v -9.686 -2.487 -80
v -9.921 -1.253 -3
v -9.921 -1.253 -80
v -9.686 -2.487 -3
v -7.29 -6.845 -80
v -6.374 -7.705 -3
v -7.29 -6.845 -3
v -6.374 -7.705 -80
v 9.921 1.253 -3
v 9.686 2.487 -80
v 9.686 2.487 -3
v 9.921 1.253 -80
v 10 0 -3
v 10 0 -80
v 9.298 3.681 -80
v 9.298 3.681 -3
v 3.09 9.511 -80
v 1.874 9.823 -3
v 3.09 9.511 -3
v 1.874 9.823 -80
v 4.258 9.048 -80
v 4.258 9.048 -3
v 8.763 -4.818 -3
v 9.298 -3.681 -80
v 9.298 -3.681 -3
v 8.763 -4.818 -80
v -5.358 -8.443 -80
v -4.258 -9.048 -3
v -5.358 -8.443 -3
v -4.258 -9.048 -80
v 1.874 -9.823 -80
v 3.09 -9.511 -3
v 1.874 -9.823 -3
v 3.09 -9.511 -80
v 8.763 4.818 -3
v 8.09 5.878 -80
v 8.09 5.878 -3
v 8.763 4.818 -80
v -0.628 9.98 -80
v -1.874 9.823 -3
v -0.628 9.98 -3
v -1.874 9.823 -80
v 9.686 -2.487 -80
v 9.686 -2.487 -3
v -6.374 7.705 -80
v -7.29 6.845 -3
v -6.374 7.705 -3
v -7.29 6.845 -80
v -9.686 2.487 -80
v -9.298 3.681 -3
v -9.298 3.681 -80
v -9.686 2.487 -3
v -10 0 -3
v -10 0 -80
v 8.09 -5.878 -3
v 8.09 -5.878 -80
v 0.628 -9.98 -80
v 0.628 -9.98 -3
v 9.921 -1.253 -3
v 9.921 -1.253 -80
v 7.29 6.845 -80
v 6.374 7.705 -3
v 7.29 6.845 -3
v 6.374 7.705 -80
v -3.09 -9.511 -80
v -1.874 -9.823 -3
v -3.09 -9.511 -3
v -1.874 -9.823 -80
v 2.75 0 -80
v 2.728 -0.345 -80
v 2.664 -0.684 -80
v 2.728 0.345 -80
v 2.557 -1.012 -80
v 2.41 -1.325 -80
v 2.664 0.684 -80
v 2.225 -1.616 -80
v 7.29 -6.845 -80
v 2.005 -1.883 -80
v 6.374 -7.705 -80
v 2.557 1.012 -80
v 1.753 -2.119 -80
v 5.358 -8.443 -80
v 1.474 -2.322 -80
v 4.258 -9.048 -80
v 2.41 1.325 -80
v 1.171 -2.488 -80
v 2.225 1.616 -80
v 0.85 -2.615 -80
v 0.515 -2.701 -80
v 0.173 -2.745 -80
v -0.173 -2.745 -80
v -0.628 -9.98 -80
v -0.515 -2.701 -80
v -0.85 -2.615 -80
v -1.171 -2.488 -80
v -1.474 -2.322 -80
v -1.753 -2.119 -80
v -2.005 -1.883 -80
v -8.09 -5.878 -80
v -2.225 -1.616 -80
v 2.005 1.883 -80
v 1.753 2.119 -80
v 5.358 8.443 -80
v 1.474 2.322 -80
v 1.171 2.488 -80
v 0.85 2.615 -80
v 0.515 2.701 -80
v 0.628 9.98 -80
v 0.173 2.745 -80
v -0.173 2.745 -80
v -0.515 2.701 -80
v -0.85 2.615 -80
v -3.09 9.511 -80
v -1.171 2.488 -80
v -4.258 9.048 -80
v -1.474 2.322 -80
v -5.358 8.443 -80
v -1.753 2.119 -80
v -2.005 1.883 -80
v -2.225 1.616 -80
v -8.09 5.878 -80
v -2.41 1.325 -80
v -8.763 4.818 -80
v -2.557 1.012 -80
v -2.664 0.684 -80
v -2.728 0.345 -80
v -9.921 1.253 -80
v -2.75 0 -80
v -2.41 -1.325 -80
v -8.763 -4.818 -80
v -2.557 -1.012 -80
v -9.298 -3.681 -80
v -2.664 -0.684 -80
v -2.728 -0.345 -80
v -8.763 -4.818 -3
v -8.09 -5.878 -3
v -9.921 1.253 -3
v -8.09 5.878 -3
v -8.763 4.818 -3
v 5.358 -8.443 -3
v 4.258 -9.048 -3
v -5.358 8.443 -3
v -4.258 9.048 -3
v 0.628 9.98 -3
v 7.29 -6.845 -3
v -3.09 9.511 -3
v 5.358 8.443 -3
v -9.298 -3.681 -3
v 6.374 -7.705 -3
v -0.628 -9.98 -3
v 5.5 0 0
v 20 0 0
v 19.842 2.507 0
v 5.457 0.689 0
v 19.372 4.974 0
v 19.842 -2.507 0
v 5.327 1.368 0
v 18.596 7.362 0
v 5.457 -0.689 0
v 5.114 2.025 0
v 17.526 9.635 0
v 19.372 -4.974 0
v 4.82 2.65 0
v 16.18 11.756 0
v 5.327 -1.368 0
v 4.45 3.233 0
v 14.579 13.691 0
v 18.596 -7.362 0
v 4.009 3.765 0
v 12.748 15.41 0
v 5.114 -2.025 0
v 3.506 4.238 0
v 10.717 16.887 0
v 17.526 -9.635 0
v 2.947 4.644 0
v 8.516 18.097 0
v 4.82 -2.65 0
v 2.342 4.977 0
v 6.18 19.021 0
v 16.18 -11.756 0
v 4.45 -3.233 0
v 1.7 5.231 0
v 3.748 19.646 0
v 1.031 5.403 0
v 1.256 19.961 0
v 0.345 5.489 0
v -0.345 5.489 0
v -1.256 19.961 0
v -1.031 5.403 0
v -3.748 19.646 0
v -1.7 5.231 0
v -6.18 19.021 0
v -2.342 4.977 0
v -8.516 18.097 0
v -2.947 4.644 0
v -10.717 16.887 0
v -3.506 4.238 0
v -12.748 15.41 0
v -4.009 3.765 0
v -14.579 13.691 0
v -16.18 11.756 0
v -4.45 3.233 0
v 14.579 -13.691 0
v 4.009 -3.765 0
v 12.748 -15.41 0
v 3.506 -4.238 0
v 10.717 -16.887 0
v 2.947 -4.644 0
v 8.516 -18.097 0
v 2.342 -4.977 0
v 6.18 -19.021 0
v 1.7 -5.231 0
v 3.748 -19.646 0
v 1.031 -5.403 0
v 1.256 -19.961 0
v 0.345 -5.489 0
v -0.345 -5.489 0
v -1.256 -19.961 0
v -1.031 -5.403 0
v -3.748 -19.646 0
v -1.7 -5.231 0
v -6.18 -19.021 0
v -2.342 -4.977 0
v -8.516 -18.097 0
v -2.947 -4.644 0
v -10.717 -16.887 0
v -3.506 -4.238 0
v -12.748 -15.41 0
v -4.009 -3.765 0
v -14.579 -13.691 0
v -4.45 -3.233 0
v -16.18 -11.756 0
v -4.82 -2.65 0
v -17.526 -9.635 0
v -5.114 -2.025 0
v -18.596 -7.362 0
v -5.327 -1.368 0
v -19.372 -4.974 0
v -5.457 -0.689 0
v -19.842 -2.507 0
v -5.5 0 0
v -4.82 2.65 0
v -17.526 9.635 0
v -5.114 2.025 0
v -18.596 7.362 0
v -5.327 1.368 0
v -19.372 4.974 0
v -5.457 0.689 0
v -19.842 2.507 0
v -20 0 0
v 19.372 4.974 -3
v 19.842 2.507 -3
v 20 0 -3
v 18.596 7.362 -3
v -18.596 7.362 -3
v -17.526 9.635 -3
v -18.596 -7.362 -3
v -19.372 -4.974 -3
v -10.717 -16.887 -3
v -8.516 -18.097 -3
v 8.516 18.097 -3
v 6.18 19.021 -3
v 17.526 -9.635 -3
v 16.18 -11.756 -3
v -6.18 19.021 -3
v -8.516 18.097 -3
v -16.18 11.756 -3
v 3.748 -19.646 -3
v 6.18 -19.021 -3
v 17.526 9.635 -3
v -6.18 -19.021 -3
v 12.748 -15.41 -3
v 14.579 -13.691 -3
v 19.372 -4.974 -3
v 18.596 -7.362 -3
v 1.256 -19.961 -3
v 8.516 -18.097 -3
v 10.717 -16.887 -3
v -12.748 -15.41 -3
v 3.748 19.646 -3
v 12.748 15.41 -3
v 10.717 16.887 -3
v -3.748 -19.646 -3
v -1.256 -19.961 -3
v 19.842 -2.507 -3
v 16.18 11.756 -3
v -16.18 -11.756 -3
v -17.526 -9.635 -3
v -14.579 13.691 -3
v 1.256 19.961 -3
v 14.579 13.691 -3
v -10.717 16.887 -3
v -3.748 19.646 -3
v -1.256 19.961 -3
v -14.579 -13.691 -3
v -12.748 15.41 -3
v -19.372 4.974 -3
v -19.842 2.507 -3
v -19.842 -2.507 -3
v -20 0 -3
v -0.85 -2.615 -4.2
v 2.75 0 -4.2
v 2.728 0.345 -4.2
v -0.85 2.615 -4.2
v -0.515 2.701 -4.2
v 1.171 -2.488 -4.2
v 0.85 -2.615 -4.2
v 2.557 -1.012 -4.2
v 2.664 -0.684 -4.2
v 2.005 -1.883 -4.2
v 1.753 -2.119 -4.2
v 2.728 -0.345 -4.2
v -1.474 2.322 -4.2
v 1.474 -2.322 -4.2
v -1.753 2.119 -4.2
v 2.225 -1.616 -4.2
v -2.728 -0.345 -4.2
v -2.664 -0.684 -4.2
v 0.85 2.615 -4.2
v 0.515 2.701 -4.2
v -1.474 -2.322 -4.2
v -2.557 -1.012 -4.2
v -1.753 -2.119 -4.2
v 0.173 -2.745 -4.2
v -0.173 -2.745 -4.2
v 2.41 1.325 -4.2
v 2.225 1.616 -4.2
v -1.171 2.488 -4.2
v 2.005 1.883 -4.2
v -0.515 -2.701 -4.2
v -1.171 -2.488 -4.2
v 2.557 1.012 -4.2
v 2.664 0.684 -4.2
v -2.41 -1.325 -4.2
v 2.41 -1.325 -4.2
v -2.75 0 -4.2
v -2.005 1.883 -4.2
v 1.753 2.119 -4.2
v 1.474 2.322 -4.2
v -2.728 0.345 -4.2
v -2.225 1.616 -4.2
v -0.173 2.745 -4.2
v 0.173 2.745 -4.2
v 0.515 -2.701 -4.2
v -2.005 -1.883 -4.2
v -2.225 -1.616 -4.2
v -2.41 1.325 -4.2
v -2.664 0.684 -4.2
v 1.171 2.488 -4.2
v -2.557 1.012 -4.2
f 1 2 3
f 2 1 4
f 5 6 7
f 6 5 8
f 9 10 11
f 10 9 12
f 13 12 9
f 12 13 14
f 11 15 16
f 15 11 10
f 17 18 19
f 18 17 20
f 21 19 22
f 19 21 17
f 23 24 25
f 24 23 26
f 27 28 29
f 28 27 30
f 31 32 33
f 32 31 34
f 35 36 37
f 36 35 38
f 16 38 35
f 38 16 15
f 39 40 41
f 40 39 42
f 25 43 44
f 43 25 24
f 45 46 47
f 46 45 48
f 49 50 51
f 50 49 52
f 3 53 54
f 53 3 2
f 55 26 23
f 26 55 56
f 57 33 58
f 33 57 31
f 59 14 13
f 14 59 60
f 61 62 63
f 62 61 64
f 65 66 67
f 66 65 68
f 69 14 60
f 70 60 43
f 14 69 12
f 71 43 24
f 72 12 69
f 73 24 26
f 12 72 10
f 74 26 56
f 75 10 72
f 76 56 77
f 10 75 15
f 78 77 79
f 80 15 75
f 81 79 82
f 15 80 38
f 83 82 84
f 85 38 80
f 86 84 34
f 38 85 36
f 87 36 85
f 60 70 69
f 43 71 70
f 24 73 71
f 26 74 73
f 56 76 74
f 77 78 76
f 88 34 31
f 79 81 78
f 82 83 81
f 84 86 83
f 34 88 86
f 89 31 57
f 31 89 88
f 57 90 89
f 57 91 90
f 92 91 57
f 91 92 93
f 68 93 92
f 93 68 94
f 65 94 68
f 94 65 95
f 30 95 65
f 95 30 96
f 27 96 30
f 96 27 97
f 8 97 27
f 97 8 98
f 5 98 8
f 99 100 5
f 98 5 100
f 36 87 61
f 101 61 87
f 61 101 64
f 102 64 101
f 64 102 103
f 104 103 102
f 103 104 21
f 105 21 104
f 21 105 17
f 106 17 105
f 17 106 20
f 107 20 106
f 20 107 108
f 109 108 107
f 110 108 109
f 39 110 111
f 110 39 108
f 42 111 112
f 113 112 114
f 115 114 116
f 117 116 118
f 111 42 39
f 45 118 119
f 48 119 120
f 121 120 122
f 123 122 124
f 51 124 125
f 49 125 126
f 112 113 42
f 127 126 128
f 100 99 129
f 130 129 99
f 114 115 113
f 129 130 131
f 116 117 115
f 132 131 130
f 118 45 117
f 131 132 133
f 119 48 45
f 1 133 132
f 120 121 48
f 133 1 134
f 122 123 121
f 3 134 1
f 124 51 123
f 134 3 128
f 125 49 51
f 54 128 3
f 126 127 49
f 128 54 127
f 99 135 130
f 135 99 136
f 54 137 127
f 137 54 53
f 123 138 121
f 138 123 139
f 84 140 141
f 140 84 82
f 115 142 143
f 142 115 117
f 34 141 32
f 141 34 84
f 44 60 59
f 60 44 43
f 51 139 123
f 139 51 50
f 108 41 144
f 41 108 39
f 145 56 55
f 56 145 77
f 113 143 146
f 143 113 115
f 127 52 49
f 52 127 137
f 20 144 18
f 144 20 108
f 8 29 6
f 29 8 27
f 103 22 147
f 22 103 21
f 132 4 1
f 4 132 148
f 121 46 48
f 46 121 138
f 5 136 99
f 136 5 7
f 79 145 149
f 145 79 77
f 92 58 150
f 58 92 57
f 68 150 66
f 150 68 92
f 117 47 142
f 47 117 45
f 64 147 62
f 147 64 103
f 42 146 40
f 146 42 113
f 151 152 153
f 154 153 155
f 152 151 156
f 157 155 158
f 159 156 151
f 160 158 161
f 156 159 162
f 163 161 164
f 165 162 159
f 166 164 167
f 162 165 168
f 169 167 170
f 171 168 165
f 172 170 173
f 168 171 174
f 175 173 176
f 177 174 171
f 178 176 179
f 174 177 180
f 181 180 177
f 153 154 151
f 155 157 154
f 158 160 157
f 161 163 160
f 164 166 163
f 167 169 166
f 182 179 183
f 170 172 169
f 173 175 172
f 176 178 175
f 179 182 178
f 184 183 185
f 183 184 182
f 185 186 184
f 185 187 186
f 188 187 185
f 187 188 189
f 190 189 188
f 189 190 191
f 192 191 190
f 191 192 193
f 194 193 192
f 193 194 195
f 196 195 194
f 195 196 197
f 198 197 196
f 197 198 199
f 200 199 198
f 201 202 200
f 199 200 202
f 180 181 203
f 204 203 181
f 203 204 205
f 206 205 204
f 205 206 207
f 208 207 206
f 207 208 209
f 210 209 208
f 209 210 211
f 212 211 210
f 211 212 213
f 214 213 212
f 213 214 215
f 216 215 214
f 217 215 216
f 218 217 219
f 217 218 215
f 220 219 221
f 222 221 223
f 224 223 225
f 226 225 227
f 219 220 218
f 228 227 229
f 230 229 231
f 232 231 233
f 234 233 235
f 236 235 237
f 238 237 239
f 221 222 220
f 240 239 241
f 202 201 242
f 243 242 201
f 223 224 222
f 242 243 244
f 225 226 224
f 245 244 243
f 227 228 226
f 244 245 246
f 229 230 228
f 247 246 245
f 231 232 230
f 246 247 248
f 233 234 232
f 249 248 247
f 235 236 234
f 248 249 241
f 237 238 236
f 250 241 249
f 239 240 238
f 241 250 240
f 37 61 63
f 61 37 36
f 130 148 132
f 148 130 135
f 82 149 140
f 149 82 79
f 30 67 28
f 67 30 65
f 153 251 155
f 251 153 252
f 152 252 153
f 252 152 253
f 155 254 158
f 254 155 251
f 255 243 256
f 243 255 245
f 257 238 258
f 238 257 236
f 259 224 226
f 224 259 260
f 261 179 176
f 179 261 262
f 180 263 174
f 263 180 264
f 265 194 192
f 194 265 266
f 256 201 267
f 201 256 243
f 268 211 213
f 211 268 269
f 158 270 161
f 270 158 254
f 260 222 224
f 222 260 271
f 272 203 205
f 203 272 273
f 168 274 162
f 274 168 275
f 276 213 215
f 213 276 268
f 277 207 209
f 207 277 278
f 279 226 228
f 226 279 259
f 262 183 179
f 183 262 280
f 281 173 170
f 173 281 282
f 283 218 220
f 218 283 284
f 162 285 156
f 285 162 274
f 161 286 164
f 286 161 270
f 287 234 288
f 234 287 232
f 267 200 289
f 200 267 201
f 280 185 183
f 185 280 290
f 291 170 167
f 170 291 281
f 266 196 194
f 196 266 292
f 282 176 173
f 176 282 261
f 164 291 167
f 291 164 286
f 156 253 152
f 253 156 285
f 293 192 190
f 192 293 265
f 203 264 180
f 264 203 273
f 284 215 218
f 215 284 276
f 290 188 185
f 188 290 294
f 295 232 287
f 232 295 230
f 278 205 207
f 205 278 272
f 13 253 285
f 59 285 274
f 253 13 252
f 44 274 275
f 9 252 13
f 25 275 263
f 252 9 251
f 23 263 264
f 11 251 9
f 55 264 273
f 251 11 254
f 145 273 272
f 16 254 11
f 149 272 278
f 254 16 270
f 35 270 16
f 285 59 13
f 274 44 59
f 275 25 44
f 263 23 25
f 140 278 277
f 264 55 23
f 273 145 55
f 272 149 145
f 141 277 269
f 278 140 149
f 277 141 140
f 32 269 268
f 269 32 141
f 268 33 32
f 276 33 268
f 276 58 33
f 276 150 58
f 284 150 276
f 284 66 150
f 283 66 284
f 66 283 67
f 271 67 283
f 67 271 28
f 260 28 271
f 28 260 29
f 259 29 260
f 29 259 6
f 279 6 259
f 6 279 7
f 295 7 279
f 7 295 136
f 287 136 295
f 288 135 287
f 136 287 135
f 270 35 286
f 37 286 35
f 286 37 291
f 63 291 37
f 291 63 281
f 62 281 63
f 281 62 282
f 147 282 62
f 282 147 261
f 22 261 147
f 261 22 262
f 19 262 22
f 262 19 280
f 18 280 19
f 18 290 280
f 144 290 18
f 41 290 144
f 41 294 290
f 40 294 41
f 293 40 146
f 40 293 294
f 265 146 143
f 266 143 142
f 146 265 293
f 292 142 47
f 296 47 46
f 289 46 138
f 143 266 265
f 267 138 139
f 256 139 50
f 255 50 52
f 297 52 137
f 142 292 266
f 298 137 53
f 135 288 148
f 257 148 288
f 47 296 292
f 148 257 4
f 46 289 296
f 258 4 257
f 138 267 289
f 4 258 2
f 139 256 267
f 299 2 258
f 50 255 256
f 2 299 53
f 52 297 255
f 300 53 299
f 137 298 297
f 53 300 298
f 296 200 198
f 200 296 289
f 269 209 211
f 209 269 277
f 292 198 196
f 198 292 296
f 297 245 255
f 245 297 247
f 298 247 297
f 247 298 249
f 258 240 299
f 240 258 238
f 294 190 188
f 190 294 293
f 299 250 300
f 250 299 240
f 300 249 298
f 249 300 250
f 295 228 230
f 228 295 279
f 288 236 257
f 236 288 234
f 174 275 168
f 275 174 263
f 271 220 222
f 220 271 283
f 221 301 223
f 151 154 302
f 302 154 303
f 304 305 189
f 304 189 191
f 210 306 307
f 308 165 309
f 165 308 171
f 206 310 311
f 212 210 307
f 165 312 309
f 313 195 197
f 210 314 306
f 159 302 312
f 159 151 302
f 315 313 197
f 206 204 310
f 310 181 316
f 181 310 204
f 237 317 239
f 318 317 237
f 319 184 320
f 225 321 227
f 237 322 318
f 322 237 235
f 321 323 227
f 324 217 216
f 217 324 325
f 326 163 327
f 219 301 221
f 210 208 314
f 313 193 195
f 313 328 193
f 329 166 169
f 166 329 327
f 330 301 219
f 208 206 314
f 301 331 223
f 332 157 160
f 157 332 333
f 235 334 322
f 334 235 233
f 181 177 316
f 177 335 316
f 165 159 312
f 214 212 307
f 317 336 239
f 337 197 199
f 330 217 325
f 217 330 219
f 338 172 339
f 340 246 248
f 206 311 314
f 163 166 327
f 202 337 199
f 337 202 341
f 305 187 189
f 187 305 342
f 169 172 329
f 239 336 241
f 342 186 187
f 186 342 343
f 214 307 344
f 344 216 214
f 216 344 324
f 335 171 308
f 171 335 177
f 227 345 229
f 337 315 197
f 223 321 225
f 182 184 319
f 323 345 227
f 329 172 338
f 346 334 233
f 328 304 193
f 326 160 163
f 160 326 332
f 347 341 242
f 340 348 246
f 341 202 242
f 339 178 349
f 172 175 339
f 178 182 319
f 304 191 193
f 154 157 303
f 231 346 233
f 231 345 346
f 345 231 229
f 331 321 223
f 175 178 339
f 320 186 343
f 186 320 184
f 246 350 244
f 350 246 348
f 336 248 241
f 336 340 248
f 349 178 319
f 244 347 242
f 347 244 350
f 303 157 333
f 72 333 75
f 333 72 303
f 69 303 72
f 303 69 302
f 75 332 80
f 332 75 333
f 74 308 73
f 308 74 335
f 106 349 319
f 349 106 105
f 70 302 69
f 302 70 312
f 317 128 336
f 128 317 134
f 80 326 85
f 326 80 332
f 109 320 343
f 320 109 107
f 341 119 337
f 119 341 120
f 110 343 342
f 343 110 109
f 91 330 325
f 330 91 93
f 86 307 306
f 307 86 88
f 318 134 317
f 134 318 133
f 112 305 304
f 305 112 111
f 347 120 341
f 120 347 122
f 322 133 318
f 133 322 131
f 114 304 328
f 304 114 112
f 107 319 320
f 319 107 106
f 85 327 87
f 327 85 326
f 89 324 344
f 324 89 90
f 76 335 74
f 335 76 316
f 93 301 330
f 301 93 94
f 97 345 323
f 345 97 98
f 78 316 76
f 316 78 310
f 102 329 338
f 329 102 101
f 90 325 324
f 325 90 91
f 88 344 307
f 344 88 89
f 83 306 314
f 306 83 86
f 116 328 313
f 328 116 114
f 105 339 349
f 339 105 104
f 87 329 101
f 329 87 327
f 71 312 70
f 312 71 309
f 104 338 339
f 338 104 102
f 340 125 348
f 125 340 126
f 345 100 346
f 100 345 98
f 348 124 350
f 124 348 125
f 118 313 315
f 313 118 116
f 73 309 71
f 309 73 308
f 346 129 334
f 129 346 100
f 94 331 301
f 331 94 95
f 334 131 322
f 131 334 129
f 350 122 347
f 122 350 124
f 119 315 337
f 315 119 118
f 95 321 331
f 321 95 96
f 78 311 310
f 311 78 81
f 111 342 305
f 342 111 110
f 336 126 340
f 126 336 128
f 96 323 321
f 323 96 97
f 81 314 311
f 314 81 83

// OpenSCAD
$fn = 50;


difference() {
	union() {
		translate(v = [0, 0, -80.0000000000]) {
			cylinder(h = 80, r = 10.0000000000);
		}
		translate(v = [0, 0, -3.0000000000]) {
			cylinder(h = 3, r = 20.0000000000);
		}
	}
	union() {
		translate(v = [0, 0, 0]) {
			rotate(a = [0, 0, 0]) {
				difference() {
					union() {
						#translate(v = [0, 0, -80.0000000000]) {
							cylinder(h = 80, r = 2.2500000000);
						}
						#translate(v = [0, 0, -4.2000000000]) {
							cylinder(h = 4.2000000000, r = 10.0000000000, r1 = 2.7500000000, r2 = 5.5000000000);
						}
						#translate(v = [0, 0, -80.0000000000]) {
							cylinder(h = 80, r = 2.7500000000);
						}
						#translate(v = [0, 0, -80.0000000000]) {
							cylinder(h = 80, r = 2.2500000000);
						}
					}
					union();
				}
			}
		}
	}
}
